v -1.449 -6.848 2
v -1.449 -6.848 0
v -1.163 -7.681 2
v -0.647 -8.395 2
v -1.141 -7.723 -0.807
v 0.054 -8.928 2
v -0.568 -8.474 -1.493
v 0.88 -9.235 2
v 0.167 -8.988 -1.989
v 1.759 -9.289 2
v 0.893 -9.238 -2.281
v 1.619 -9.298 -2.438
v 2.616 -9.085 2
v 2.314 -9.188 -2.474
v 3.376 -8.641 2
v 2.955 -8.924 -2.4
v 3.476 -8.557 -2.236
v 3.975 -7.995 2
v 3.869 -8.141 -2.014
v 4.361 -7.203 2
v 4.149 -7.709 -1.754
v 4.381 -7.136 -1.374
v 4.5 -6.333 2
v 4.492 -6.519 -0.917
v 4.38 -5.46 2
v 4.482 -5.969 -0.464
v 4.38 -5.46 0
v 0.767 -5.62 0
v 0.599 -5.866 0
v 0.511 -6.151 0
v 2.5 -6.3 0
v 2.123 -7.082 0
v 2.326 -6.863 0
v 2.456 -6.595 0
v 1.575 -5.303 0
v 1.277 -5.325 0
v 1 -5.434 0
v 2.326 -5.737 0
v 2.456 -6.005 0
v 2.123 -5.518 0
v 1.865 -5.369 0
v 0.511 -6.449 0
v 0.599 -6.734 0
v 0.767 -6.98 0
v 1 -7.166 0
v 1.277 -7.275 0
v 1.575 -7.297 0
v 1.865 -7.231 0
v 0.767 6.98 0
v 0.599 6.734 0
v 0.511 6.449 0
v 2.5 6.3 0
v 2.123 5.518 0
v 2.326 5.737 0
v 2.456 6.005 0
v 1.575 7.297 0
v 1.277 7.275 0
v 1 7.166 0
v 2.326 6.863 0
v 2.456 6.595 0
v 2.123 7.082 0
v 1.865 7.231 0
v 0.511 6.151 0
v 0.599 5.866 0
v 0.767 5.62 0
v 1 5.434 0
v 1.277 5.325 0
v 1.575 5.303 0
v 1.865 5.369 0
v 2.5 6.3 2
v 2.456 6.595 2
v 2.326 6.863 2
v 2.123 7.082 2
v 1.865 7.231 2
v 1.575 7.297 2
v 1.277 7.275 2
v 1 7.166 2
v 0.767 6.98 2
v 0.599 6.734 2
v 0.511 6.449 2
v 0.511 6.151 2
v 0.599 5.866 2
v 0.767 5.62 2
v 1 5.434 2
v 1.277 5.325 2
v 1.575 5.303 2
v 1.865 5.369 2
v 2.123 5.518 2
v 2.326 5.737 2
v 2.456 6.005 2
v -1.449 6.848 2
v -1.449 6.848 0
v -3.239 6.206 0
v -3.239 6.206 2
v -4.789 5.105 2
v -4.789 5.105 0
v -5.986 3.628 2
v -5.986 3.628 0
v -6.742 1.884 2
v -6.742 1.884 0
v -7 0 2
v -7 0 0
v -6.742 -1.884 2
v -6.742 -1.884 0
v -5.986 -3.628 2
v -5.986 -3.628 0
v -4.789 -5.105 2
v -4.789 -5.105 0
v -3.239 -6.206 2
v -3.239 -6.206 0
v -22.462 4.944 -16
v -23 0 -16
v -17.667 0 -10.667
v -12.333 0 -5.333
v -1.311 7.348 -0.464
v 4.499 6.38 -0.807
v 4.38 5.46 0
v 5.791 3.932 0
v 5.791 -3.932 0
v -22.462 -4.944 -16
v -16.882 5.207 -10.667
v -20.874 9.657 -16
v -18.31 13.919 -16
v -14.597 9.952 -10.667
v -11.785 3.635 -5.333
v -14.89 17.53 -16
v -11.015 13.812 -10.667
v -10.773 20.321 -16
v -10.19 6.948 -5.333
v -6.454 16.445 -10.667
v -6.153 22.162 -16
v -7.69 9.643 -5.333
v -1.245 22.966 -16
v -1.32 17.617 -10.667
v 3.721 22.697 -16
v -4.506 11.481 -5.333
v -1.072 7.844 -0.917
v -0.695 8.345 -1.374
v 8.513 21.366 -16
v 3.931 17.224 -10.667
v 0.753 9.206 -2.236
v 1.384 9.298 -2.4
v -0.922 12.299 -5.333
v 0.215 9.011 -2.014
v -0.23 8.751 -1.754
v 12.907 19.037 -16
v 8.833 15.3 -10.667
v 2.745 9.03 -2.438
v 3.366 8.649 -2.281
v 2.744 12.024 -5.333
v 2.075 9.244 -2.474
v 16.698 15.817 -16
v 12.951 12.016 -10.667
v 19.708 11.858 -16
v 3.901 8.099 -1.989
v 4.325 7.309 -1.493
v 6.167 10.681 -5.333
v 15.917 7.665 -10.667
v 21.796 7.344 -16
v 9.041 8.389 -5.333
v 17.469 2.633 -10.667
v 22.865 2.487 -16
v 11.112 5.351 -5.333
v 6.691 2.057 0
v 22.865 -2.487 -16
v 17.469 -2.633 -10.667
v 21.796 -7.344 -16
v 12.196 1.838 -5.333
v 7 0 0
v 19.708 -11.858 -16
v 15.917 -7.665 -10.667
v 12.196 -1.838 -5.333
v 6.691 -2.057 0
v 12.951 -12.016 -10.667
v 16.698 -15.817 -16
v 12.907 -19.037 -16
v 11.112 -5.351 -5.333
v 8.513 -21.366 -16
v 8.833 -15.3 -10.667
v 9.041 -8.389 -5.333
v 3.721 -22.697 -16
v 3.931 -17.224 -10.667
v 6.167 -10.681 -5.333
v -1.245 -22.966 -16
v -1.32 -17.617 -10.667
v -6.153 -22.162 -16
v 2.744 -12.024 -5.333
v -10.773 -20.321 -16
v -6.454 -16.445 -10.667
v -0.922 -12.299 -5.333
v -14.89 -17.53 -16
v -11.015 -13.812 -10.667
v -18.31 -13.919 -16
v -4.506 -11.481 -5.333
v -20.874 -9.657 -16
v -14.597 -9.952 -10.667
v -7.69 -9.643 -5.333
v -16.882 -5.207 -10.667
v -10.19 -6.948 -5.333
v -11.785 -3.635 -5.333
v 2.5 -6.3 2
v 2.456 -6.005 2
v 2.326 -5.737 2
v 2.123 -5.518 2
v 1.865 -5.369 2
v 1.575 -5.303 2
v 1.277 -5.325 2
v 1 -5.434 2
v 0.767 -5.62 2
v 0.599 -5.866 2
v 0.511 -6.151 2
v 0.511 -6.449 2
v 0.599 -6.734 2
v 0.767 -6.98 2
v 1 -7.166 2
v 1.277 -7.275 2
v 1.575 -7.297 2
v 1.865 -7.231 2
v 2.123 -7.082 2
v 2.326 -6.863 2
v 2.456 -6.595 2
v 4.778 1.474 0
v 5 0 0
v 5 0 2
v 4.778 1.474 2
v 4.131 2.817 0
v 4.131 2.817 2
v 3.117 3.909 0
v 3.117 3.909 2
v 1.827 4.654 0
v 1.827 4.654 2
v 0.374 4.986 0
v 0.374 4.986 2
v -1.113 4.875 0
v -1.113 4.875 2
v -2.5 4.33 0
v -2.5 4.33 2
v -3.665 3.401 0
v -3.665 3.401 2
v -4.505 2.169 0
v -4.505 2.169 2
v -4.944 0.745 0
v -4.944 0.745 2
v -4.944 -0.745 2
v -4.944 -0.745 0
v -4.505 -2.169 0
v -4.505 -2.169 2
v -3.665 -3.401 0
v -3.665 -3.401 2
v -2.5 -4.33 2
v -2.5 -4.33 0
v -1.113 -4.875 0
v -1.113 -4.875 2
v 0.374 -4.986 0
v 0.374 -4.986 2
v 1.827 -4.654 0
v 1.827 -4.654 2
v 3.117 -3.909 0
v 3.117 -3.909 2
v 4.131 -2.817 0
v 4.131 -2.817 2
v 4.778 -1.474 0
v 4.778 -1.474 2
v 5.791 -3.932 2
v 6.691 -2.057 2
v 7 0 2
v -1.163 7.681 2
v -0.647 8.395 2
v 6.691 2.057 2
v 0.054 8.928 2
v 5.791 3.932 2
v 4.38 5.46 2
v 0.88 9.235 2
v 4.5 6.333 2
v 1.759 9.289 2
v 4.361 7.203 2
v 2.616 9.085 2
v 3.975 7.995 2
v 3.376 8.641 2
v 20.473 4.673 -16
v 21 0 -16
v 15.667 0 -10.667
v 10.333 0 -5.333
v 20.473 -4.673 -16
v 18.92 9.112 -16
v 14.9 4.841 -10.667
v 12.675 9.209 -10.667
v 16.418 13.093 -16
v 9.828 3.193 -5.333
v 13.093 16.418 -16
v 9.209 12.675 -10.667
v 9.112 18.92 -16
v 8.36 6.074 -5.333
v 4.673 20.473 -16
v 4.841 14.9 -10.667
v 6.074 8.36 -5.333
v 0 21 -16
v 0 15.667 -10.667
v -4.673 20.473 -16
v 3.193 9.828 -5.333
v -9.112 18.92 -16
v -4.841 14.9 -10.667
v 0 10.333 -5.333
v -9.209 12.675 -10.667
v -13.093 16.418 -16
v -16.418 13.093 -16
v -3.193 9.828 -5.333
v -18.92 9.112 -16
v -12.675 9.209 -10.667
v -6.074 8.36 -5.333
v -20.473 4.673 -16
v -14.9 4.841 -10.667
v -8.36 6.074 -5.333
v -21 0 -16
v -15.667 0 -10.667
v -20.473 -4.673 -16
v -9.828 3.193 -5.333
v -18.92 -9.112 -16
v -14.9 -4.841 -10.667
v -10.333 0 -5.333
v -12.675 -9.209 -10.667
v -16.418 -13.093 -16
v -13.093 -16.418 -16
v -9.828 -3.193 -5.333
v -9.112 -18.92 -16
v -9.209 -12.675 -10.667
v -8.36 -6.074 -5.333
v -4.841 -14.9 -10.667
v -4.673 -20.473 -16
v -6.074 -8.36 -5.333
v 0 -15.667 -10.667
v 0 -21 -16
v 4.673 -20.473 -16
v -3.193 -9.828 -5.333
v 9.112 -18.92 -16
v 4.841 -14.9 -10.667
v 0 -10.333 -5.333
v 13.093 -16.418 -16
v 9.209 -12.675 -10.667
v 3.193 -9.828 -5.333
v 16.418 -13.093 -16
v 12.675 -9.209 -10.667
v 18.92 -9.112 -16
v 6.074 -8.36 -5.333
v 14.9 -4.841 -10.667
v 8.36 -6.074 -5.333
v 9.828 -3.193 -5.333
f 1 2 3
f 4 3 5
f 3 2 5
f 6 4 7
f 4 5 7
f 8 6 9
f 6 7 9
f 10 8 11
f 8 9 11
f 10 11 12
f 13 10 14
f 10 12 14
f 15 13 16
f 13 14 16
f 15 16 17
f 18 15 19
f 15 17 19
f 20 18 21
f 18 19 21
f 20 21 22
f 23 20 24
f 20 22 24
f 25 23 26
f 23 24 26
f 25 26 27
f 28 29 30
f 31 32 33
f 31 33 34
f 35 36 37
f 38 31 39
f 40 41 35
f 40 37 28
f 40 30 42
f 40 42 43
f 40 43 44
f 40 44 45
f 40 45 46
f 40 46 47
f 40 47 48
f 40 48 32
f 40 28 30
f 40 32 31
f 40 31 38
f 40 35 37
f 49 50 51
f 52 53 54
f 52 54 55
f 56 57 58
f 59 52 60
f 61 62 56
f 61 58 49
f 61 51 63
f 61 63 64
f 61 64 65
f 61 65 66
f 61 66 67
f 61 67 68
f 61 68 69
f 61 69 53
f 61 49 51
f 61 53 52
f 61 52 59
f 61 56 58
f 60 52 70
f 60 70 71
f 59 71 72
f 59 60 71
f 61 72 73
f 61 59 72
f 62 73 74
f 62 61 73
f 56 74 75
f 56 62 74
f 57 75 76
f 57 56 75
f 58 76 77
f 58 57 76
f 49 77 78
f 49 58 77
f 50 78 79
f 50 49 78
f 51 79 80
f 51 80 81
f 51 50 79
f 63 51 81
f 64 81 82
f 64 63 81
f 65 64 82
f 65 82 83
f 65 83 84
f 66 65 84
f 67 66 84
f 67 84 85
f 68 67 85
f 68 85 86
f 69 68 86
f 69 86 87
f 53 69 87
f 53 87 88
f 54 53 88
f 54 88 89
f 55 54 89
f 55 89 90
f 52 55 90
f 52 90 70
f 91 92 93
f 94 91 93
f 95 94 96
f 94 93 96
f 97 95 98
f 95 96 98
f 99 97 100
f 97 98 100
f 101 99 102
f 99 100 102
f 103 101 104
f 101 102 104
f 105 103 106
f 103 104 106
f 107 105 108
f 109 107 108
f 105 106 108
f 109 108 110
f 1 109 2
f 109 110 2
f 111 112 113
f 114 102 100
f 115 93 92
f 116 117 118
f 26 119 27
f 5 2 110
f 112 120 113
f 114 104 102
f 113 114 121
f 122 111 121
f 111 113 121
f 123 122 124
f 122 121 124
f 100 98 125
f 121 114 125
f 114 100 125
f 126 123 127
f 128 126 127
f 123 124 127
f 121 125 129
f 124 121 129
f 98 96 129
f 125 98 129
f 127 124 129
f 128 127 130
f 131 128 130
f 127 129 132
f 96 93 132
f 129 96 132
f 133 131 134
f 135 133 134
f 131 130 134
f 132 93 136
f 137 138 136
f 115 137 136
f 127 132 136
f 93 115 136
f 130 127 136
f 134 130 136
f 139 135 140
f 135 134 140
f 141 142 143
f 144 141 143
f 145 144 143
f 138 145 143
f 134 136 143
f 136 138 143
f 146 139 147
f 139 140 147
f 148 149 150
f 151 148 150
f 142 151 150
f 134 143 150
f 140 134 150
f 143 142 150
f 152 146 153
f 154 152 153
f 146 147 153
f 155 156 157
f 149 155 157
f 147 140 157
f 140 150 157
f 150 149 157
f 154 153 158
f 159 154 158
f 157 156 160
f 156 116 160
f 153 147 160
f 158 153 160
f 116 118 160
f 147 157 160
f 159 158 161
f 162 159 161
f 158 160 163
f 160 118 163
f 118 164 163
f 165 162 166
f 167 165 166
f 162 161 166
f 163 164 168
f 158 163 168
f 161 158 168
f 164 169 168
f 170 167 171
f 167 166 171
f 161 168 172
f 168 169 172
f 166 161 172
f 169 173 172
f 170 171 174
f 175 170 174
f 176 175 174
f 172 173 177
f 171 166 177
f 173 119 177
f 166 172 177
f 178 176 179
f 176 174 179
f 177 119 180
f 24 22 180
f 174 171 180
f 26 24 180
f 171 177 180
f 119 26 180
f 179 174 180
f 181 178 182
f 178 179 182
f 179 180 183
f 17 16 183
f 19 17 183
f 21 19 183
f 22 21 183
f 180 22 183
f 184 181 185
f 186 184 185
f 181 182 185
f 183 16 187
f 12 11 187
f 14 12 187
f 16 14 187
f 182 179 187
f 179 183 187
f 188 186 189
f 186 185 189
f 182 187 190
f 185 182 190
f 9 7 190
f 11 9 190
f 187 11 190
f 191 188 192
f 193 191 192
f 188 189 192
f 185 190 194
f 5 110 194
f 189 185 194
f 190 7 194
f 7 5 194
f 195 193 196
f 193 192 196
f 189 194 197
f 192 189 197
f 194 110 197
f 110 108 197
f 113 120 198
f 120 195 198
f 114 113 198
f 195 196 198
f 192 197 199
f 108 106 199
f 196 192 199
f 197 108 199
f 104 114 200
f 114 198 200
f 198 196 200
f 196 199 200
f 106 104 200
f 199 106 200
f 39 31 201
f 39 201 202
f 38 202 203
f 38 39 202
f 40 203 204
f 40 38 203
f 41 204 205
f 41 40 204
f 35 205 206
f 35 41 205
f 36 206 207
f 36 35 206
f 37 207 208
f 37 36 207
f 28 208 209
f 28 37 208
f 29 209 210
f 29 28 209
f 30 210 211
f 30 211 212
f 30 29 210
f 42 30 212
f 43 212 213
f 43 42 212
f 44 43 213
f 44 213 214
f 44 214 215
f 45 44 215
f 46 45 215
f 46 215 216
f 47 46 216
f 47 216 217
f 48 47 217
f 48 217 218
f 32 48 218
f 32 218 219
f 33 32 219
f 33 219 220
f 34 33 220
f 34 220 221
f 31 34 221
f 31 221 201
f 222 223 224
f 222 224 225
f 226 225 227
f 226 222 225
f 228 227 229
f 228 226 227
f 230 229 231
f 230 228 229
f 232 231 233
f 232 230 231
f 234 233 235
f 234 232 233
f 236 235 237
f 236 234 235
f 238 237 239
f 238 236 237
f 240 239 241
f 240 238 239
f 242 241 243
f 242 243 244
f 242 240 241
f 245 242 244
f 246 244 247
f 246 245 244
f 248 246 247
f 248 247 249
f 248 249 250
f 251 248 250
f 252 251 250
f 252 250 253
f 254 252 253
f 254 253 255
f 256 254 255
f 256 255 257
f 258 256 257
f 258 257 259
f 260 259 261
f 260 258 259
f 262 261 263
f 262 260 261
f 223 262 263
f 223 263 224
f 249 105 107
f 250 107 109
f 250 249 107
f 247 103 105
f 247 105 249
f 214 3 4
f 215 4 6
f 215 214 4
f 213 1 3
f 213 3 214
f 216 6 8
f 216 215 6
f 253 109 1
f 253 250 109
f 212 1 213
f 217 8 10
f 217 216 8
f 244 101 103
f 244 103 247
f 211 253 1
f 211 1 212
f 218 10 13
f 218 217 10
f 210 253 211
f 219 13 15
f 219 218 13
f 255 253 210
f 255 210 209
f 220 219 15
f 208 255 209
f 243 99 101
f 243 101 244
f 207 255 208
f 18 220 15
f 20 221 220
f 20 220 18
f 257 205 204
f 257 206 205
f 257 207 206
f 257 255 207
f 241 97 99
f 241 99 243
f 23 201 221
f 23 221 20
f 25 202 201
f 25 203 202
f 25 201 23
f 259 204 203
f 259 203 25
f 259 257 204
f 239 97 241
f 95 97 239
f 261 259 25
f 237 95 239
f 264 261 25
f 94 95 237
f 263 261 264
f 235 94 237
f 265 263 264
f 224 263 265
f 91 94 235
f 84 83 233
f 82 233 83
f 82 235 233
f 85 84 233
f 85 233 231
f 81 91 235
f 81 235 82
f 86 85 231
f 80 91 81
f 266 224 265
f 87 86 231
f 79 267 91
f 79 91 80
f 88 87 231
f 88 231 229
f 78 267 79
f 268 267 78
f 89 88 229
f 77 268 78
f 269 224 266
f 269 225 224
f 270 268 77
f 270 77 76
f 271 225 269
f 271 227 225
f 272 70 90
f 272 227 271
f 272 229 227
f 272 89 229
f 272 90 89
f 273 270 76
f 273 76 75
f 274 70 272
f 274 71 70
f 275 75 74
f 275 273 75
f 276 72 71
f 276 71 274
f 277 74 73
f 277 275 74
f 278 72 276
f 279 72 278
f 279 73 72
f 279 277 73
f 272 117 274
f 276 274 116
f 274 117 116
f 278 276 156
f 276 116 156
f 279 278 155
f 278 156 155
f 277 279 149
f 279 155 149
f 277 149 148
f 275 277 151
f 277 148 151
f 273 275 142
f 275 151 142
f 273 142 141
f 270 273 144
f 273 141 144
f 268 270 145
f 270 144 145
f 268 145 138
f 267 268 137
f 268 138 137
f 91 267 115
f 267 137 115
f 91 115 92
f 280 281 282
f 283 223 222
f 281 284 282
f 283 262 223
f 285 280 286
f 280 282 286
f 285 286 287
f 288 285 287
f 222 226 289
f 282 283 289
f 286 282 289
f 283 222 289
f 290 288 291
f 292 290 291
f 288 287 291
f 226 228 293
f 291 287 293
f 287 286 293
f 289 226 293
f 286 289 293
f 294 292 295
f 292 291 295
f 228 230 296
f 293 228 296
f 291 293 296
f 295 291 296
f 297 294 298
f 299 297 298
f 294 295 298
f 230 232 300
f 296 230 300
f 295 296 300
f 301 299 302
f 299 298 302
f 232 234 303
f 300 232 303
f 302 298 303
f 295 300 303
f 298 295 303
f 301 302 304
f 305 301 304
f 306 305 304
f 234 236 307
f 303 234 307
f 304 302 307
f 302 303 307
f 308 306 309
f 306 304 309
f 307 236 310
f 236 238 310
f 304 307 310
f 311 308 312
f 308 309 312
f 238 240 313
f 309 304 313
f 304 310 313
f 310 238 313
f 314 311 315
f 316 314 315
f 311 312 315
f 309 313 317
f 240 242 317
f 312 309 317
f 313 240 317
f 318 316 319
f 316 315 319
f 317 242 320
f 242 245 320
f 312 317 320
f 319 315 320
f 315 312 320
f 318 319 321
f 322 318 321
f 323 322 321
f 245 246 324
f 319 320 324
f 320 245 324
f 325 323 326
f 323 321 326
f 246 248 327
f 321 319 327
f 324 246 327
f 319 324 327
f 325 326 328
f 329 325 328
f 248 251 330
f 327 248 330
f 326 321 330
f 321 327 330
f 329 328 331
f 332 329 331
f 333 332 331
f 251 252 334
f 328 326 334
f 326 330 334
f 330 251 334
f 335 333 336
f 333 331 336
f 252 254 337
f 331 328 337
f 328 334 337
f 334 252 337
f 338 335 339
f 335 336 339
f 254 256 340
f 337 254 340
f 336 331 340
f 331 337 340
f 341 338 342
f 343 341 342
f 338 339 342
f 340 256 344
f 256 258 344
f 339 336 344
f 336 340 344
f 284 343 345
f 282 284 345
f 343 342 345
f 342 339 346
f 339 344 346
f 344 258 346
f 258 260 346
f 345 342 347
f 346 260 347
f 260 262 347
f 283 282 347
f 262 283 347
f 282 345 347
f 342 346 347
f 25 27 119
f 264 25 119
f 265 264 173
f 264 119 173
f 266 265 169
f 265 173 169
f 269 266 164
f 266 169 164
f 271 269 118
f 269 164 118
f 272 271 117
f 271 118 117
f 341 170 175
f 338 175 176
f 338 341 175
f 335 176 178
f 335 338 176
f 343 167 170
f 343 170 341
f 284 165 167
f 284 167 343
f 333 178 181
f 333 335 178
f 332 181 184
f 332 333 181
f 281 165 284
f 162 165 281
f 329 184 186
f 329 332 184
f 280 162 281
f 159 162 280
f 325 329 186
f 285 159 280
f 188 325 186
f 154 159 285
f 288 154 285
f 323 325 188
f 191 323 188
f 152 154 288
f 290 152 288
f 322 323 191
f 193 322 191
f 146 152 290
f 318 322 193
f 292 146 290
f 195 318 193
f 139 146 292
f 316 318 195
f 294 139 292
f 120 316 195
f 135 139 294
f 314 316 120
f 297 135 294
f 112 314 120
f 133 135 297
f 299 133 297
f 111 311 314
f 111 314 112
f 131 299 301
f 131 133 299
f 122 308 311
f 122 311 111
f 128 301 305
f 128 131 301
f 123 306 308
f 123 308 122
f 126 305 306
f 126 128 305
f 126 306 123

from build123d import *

# Parameters (mm, degrees)
SKETCH_1_R          = 1
SKETCH_1_R_2        = 5
EXTRUDE_1_DEPTH     = 2
SKETCH_2_R          = 7
EXTRUDE_2_DEPTH     = 16
EXTRUDE_2_DRAFT     = -45
SKETCH_3_R          = 5
CUT_EXTRUDE_1_DEPTH = 37.249137921
CUT_EXTRUDE_1_DRAFT = 45
EXTRUDE_3_REACH     = 38.249
EXTRUDE_5_REACH     = 38.249
SKETCH_5_R          = 1


with BuildPart() as part:
    # Эскиз1 → Бобышка-Вытянуть1 (new body)
    with BuildSketch(Plane.XY):
        with BuildLine():
            ThreePointArc((-1.4494714, 6.848286841), (-7, 0), (-1.4494714, -6.848286841))
            ThreePointArc((-1.4494714, -6.848286841), (2.194861582, -9.218418644), (4.380086565, -5.46029685))
            ThreePointArc((4.380086565, -5.46029685), (7, 0), (4.380086565, 5.46029685))
            ThreePointArc((4.380086565, 5.46029685), (2.194861582, 9.218418644), (-1.4494714, 6.848286841))
        make_face()
        with Locations((1.5, 6.3)):
            Circle(SKETCH_1_R, mode=Mode.SUBTRACT)
        with Locations((1.5, -6.3)):
            Circle(SKETCH_1_R, mode=Mode.SUBTRACT)
        Circle(SKETCH_1_R_2, mode=Mode.SUBTRACT)
    extrude(amount=EXTRUDE_1_DEPTH)


with BuildPart() as extrude_2_tool:
    # Эскиз2 → Бобышка-Вытянуть2 (with draft: the straight prism first)
    with BuildSketch(Plane(origin=(0, 0, 0), x_dir=(-1, 0, 0), z_dir=(0, 0, -1))):
        Circle(SKETCH_2_R)
    extrude(amount=EXTRUDE_2_DEPTH)
    # Бобышка-Вытянуть2: the draft: its side faces are tilted about the plane it starts from
    extrude_2_sides = [extrude_2_tool.faces().sort_by_distance(p)[0] for p in [
        (7, 0, -8),
    ]]
    draft(extrude_2_sides, Plane(origin=(0, 0, 0), x_dir=(-1, 0, 0), z_dir=(0, 0, -1)), EXTRUDE_2_DRAFT)


with BuildPart() as part_1:
    add(part.part)

    # Бобышка-Вытянуть2: add extrude_2_tool
    add(extrude_2_tool.part)


with BuildPart() as cut_extrude_1_tool:
    # Эскиз3 → Вырез-Вытянуть1 (with draft: the straight prism first)
    with BuildSketch(Plane.XY):
        Circle(SKETCH_3_R)
    extrude(amount=-CUT_EXTRUDE_1_DEPTH)
    # Вырез-Вытянуть1: the draft: its side faces are tilted about the plane it starts from
    cut_extrude_1_sides = [cut_extrude_1_tool.faces().sort_by_distance(p)[0] for p in [
        (-5, 0, -18.62456896),
    ]]
    draft(cut_extrude_1_sides, Plane.XY, CUT_EXTRUDE_1_DRAFT)


with BuildPart() as part_2:
    add(part_1.part)

    # Вырез-Вытянуть1: cut by cut_extrude_1_tool
    add(cut_extrude_1_tool.part, mode=Mode.SUBTRACT)

    # Эскиз4 → Бобышка-Вытянуть3 (add, up to next)
    with BuildSketch(Plane(origin=(0, 0, 0), x_dir=(-1, 0, 0), z_dir=(0, 0, -1)), mode=Mode.PRIVATE) as extrude_3_sk1:
        with BuildLine():
            ThreePointArc((-4.380086565, -5.46029685), (-3.467221669, -6.080984616), (-2.468130818, -6.550445043))
            ThreePointArc((-2.468130818, -6.550445043), (-1.731620527, -7.272806215), (-0.74860738, -6.959855386))
            ThreePointArc((-0.74860738, -6.959855386), (0.354844302, -6.991000323), (1.4494714, -6.848286841))
            ThreePointArc((1.4494714, -6.848286841), (-2.194861582, -9.218418644), (-4.380086565, -5.46029685))
        make_face()
    extrude_3_tool1 = extrude(extrude_3_sk1.sketch, amount=EXTRUDE_3_REACH, mode=Mode.PRIVATE) - part_2.part
    # Эскиз4 → Бобышка-Вытянуть3 (add, up to next)
    with BuildSketch(Plane(origin=(0, 0, 0), x_dir=(-1, 0, 0), z_dir=(0, 0, -1)), mode=Mode.PRIVATE) as extrude_3_sk2:
        with BuildLine():
            ThreePointArc((1.4494714, 6.848286841), (0.354844302, 6.991000323), (-0.74860738, 6.959855386))
            ThreePointArc((-0.74860738, 6.959855386), (-1.731620527, 7.272806215), (-2.468130818, 6.550445043))
            ThreePointArc((-2.468130818, 6.550445043), (-3.467221669, 6.080984616), (-4.380086565, 5.46029685))
            ThreePointArc((-4.380086565, 5.46029685), (-2.194861582, 9.218418644), (1.4494714, 6.848286841))
        make_face()
    extrude_3_tool2 = extrude(extrude_3_sk2.sketch, amount=EXTRUDE_3_REACH, mode=Mode.PRIVATE) - part_2.part
    add(extrude_3_tool1.solids().sort_by_distance((1.839664, -7.72659, 0))[0])
    add(extrude_3_tool2.solids().sort_by_distance((1.839664, 7.72659, 0))[0])

    # Эскиз5 → Бобышка-Вытянуть5 (add, up to next)
    with BuildSketch(Plane.XY, mode=Mode.PRIVATE) as extrude_5_sk1:
        with Locations((1.5, 6.3)):
            Circle(SKETCH_5_R)
    extrude_5_tool1 = extrude(extrude_5_sk1.sketch, amount=-EXTRUDE_5_REACH, mode=Mode.PRIVATE) - part_2.part
    # Эскиз5 → Бобышка-Вытянуть5 (add, up to next)
    with BuildSketch(Plane.XY, mode=Mode.PRIVATE) as extrude_5_sk2:
        with Locations((1.5, -6.3)):
            Circle(SKETCH_5_R)
    extrude_5_tool2 = extrude(extrude_5_sk2.sketch, amount=-EXTRUDE_5_REACH, mode=Mode.PRIVATE) - part_2.part
    add(extrude_5_tool1.solids().sort_by_distance((1.5, 6.3, 0))[0])
    add(extrude_5_tool2.solids().sort_by_distance((1.5, -6.3, 0))[0])


solid = part_2.part
